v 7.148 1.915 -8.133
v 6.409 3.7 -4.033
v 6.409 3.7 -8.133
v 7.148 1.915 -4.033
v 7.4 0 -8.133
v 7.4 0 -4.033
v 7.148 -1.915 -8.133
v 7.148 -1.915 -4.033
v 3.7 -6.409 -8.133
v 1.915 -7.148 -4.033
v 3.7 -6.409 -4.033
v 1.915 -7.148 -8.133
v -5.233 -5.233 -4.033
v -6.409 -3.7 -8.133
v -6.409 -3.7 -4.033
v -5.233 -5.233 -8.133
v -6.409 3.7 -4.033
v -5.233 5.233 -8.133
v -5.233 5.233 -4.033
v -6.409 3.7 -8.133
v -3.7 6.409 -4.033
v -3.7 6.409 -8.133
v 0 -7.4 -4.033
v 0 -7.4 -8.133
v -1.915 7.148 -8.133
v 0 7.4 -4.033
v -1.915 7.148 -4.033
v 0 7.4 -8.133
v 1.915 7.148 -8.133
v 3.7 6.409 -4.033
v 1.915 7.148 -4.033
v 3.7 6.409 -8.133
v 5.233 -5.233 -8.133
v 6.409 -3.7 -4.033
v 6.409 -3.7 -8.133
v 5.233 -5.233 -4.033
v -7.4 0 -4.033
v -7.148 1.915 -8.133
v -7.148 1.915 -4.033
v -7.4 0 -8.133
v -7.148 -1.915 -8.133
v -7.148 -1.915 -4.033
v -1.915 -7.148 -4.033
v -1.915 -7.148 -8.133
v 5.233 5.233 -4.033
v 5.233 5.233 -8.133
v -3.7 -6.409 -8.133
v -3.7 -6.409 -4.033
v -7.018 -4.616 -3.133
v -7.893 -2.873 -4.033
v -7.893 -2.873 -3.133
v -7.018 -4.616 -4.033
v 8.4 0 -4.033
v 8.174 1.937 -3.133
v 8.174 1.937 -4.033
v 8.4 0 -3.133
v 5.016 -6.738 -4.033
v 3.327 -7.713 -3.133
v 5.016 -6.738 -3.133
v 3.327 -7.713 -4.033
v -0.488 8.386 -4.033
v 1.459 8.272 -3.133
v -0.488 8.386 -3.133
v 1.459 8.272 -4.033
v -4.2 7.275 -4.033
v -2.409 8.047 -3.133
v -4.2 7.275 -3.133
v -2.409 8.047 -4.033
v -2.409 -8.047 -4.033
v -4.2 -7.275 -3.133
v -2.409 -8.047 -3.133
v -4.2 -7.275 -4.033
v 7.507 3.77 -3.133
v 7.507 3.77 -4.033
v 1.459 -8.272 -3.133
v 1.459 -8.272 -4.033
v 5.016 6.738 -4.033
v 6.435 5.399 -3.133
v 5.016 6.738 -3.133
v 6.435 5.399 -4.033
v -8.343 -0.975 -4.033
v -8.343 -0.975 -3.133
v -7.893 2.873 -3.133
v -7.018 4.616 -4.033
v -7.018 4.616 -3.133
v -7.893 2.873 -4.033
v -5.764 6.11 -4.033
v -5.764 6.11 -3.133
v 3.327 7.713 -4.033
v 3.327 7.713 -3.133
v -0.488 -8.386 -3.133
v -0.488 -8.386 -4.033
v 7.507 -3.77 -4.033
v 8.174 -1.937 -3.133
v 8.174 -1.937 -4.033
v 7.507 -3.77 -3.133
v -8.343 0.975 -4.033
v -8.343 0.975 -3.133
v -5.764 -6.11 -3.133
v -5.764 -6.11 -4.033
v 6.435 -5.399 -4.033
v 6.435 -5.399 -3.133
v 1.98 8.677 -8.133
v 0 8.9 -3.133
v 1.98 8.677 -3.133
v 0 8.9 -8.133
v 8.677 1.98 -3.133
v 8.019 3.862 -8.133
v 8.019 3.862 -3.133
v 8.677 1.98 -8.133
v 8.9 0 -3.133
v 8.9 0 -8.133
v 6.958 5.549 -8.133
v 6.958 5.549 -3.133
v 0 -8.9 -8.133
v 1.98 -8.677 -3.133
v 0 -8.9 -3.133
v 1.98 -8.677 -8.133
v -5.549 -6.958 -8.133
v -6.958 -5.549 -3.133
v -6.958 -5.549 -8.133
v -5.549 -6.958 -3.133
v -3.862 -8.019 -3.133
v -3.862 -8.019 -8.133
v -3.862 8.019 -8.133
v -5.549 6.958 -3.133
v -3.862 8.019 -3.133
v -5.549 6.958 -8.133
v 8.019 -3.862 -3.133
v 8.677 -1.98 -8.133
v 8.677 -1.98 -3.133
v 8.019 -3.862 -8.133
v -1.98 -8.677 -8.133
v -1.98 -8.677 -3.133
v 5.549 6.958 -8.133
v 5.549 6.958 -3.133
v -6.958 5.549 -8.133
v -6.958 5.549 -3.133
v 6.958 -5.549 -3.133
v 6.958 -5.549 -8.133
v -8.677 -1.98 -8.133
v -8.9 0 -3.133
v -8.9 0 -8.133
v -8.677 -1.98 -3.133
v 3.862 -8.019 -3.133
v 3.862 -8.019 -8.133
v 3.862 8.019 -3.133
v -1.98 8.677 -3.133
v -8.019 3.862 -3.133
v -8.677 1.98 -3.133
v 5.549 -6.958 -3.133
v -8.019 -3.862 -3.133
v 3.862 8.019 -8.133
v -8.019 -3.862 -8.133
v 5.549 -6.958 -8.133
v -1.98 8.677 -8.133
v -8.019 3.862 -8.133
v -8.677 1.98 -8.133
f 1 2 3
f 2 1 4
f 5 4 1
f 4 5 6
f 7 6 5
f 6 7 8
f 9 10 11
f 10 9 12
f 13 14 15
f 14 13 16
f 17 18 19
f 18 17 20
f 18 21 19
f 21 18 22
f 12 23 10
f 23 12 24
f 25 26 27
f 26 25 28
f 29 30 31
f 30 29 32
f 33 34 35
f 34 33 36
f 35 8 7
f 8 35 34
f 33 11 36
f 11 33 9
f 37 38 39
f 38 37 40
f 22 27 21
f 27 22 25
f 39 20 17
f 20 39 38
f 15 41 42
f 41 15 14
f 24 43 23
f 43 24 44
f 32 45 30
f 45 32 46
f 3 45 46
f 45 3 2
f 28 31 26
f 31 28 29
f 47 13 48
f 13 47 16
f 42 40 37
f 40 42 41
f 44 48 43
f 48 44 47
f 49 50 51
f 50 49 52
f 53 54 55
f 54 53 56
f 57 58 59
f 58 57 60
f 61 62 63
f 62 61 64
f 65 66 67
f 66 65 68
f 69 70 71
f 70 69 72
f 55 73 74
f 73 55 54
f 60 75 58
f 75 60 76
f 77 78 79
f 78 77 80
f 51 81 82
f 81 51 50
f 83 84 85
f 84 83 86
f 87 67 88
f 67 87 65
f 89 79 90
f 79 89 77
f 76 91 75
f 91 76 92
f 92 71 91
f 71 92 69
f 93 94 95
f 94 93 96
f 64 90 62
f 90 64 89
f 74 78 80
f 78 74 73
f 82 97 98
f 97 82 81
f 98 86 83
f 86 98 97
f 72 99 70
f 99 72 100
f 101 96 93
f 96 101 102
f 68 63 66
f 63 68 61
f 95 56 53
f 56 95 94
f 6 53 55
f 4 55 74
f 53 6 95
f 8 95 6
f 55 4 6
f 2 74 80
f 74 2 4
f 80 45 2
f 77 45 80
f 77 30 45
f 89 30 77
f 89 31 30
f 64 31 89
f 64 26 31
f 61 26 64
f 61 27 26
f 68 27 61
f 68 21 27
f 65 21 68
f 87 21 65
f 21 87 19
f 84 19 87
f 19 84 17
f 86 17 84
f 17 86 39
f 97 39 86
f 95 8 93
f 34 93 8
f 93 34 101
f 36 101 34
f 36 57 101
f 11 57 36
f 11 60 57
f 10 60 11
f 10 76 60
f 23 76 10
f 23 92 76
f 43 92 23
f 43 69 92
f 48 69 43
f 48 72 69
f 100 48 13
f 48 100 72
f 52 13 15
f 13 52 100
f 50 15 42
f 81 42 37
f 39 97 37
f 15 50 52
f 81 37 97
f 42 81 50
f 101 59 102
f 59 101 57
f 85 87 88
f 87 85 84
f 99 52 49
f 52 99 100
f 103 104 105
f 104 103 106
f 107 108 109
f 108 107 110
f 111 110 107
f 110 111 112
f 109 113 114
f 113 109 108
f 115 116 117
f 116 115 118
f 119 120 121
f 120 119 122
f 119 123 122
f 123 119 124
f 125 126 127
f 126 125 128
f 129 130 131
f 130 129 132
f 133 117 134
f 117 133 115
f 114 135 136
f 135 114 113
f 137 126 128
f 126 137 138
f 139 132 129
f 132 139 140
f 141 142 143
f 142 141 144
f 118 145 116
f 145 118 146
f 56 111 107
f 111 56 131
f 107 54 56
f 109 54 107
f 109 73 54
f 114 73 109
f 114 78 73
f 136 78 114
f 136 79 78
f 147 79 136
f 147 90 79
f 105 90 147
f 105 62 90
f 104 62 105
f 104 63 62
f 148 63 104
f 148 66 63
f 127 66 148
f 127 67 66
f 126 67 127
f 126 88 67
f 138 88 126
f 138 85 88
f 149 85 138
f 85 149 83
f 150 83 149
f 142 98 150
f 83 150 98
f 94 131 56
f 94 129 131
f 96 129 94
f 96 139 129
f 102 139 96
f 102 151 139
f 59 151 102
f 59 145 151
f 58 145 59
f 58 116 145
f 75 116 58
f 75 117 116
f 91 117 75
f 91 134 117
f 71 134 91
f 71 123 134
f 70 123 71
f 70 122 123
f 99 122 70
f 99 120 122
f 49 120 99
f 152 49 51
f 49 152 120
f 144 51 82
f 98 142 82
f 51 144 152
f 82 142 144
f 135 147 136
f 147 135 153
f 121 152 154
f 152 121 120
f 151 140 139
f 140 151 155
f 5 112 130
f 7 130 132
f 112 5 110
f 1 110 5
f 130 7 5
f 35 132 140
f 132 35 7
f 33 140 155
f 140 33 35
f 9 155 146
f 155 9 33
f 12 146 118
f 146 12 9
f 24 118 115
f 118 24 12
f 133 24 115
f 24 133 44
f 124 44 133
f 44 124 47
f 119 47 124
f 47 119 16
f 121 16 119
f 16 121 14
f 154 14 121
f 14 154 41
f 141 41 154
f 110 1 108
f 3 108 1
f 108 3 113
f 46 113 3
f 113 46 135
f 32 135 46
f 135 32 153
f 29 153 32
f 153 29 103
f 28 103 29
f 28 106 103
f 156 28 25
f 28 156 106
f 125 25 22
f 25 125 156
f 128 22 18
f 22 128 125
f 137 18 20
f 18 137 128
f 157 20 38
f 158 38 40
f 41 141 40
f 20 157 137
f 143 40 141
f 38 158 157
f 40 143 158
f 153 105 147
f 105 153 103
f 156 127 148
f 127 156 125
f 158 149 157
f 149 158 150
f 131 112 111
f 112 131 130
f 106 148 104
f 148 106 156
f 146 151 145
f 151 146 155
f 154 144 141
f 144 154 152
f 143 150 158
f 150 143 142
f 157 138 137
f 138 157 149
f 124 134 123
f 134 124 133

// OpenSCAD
// contact lens

phi_cl = 13.8;
RC_cl = 8.6;
e_cl = 1;
d1_cl = sqrt(pow(RC_cl, 2) - pow(phi_cl/2, 2));


module contact_lens(phi_cl, RC_cl, e_cl, d1_cl){
     translate([0, 0, e_cl-RC_cl])
     difference(){
	  difference(){
	       sphere(RC_cl+e_cl, $fn=36);
	       sphere(RC_cl, $fn=36);
	       translate([0, 0, -d1_cl])
		    cube([4 * RC_cl, 4*RC_cl,
			  2*d1_cl + RC_cl],
			 center=true);
	  }
     };
}


%contact_lens(phi_cl, RC_cl, e_cl, d1_cl);

h=5;
module lens_tube(h, phi_cl, RC_cl, e_cl, d1_cl){
     translate([0, 0, -h-d1_cl+2*e_cl])
	  difference(){
	  cylinder(h=h, d=phi_cl+4*e_cl);
	  union(){
	       translate([0, 0, -e_cl/2])
		    cylinder(h=h+e_cl,
			     d=phi_cl+e_cl);
	       translate([0, 0, h-e_cl+0.1])
		    cylinder(h=e_cl, d=phi_cl+3*e_cl);
	  }
     }
}
lens_tube(h, phi_cl, RC_cl, e_cl, d1_cl);
